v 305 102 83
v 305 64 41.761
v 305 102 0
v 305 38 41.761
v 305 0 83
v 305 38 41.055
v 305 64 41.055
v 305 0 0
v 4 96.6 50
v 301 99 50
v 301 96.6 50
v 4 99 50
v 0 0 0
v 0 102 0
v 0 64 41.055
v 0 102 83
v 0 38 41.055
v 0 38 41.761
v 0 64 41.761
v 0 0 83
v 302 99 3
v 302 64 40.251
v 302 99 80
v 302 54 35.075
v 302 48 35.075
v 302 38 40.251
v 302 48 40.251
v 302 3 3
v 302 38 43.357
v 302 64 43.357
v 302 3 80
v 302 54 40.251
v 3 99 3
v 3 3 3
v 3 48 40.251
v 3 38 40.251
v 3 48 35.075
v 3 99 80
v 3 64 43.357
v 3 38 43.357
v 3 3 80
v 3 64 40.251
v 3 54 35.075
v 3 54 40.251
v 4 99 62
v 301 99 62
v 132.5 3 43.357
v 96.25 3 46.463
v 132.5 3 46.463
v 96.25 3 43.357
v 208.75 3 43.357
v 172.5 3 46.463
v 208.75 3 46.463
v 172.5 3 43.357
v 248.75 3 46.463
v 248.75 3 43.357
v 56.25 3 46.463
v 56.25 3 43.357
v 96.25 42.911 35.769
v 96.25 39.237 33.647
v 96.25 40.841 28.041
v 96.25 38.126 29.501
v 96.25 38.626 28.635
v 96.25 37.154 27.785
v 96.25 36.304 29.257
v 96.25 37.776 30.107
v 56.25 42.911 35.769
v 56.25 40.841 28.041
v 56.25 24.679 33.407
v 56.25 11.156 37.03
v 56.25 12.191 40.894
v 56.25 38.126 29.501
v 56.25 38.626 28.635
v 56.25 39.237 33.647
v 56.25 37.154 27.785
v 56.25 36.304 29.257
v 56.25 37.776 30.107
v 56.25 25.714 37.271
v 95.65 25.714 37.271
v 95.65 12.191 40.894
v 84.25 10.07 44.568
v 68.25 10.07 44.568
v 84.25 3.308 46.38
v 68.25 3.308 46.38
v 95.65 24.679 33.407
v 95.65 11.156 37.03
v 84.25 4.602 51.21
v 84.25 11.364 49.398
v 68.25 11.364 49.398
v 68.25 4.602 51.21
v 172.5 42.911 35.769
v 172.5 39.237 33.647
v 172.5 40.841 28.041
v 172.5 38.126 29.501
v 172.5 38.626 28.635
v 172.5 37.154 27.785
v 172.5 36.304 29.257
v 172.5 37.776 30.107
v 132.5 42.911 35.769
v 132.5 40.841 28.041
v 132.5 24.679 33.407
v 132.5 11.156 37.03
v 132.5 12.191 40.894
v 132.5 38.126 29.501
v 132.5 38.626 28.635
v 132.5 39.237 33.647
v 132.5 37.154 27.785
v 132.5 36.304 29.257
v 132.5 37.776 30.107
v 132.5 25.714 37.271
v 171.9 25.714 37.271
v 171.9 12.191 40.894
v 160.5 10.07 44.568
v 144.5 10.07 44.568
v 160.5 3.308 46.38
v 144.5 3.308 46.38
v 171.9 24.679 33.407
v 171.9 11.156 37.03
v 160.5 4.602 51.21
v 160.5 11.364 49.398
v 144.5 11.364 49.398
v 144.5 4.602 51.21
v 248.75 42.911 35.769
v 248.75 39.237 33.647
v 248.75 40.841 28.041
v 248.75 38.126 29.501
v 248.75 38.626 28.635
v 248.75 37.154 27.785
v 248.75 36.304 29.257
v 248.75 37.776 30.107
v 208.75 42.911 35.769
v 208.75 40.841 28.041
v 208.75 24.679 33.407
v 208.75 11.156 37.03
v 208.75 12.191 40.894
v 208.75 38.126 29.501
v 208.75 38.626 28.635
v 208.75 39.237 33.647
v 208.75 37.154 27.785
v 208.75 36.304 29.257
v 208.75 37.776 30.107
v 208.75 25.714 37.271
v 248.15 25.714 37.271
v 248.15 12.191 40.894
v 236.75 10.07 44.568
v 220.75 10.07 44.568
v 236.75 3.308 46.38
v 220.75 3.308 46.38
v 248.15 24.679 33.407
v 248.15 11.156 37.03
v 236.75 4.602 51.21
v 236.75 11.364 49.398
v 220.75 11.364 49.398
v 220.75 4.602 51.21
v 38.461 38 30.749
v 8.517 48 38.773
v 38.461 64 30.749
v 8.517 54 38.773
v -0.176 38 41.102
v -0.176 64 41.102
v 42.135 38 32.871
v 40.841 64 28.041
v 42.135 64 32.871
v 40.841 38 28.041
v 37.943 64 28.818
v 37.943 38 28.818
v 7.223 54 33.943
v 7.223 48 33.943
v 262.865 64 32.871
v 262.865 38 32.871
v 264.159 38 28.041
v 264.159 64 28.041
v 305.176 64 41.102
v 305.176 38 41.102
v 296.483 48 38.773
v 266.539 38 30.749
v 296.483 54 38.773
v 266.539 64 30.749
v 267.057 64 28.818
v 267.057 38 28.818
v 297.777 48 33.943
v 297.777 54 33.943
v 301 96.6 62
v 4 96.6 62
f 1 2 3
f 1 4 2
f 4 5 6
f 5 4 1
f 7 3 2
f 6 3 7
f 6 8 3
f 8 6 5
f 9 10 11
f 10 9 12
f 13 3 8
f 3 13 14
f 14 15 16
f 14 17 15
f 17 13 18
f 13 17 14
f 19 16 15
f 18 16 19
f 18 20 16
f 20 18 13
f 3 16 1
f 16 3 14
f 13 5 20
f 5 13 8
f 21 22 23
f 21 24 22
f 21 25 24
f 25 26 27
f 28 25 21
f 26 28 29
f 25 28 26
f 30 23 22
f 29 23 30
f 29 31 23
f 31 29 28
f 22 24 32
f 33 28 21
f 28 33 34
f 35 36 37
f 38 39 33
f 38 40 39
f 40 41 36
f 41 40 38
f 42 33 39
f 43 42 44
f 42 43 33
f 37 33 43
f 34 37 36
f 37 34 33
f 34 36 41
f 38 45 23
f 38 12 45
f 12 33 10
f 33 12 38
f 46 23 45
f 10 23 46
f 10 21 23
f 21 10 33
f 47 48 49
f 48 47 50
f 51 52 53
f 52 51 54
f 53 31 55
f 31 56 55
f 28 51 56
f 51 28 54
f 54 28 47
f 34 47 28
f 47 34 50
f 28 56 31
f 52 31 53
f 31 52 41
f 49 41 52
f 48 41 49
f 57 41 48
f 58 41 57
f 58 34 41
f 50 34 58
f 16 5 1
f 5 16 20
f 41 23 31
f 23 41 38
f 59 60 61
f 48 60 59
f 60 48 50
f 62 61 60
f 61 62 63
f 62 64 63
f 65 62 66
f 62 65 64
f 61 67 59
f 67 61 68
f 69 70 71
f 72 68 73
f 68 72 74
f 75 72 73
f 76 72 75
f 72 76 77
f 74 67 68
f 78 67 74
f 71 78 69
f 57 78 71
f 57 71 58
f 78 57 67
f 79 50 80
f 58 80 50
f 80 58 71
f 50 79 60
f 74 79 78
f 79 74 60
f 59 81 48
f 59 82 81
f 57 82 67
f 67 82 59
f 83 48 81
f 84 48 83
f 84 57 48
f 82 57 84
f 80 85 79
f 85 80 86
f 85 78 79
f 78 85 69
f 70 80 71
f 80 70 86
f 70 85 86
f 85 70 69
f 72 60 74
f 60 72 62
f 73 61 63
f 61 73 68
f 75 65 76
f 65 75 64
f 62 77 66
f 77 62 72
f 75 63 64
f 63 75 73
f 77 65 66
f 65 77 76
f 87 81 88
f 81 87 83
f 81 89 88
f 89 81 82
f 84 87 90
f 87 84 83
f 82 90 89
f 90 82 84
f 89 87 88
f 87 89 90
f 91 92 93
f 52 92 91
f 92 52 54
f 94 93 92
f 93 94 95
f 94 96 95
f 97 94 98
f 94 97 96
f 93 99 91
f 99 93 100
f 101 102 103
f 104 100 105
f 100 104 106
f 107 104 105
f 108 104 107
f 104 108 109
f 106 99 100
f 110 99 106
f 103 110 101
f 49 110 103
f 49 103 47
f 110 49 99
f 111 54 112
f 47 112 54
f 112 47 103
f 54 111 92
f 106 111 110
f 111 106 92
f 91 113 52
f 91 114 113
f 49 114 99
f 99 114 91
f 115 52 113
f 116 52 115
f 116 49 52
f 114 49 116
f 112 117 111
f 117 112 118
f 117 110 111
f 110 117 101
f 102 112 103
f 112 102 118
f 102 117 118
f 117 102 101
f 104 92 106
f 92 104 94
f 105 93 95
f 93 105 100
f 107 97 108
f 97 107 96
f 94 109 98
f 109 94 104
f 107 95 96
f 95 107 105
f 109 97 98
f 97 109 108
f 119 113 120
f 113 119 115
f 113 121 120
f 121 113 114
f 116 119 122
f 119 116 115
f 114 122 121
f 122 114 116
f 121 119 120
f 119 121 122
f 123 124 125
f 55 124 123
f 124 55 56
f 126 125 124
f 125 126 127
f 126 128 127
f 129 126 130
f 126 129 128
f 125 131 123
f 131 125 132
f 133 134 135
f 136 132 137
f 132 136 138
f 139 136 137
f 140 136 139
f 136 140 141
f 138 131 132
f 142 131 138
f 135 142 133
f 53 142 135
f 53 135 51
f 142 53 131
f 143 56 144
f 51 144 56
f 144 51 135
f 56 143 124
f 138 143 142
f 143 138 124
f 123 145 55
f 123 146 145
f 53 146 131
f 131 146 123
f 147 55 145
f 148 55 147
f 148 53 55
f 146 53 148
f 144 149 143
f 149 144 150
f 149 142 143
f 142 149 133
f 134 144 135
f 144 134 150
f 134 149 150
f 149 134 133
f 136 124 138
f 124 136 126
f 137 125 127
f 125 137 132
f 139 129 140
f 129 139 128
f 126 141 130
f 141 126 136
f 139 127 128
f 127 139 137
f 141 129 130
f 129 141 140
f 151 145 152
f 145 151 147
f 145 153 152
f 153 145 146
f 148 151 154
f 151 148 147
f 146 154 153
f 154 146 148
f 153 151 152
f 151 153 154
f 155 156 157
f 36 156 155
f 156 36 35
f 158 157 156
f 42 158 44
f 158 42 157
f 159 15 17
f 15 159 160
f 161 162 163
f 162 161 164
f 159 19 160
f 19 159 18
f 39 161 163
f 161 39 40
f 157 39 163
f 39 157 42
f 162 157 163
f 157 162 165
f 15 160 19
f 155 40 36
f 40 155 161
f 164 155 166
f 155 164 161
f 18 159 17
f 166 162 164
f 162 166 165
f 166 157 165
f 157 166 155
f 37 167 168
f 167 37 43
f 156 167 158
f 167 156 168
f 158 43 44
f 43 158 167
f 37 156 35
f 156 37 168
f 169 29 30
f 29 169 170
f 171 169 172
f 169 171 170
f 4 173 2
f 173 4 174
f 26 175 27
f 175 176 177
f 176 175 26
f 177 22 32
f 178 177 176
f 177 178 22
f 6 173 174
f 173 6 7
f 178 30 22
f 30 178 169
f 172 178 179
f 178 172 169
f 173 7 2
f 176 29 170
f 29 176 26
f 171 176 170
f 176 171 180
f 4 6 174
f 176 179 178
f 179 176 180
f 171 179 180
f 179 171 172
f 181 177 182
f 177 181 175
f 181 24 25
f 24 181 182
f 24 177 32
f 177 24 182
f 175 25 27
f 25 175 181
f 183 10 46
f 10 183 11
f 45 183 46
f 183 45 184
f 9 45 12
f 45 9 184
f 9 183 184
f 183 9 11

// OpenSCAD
// file: common.scad
// common.scad — shared geometry for FLIP-LEVER / CAM-LATCH RIM CLAMP family
// Coordinate frame:
//   X: 0..305 (long axis)   Y: 0..102 (Y=0 FRONT/open, Y=102 BACK/door=FLUSH)
//   Z: up.  New tray base z=0, top face z=50.  Top tray base z=50, rim top z=83.
// ALL levers/hinges live on FRONT wall (y=0) and SHORT ENDS (x=0, x=305).
// NOTHING crosses y=102 (door face). Top tray gets ZERO added geometry.

// ── master dims ────────────────────────────────────────────────
NW = 305;  ND = 102;  NH = 50;   // new tray
TW = 305;  TD = 102;  TH = 33;   // top tray (FIXED reference)
wall = 3;
rim_top_z = NH + TH;             // = 83

// ── colours ────────────────────────────────────────────────────
C_new   = "#1565C0";
C_top   = "#90A4AE";
C_lever = "#EF6C00";   // override per file if desired

// ── core tray bodies ───────────────────────────────────────────
module new_tray() {
    color(C_new)
    difference() {
        cube([NW, ND, NH]);
        translate([wall, wall, wall])
            cube([NW-2*wall, ND-2*wall, NH]);
        // side windows (long walls): 45(X)x16(Z), center z=64 -> 56..72
        for (cx = [76.25, 152.5, 228.75]) {
            // FRONT wall y=0..3
            translate([cx-22.5, -0.1, 56]) cube([45, wall+0.2, 16]);
            // BACK wall y=99..102
            translate([cx-22.5, ND-wall-0.1, 56]) cube([45, wall+0.2, 16]);
        }
    }
}

// FLUSH back guide wall: a low rib on the new tray top face along the BACK
// edge that pockets the top tray's outer wall from the INSIDE only.
// It rises to z below the rim and DOES NOT overhang the drop path and
// NEVER crosses y=102 (it sits inboard of the door face).
module back_guide() {
    gw = 2.4;          // guide rib thickness
    gh = 12;           // rib height above new tray top (z=50..62)
    inset = wall;      // inner face aligns to tray inner wall (y=99 plane outer)
    color(C_new)
    translate([wall+1, ND - wall - gw, NH])
        cube([NW - 2*(wall+1), gw, gh]);
}

module top_tray() {
    color(C_top)
    translate([0, 0, NH])
    difference() {
        cube([TW, TD, TH]);
        translate([wall, wall, 0])
            cube([TW-2*wall, TD-2*wall, TH-wall]);
    }
}
// main file
// 04_window_hook_cams.scad
// FLIP-LEVER RIM CLAMP — Variant: THREE front cam levers whose hook does DOUBLE
// duty — a finger enters the front WINDOW (z56..72) to key/locate the lever, and
// the same arm's upper lip reaches OVER the rim (z>=83) to clamp the TOP tray.
// + end clamps. NONE on back/door.
//
// Why both: the window finger resists side-shift and hides the lever profile
// (low overhead); the rim lip provides the actual vertical clamp on the rigid
// top tray. Pure window entry alone cannot clamp the top tray, so we add the
// rim lip. Living-hinge web on the FRONT outer wall, axis along X at z=44.
include <common.scad>
C_lever = "#EF6C00";
lock = 0;
$fn = 48;

hinge_z   = NH - 6;
arm_len   = rim_top_z - hinge_z + 4;   // up past rim
bar_t     = 3.0;
lhinge_t  = 0.6;
lip_ext   = 5;
lip_t     = 3.0;
cam_w     = 40;
windows_x = [76.25, 152.5, 228.75];

// window finger: short stub partway up the arm that swings into the window slot
win_finger_z = 56 - hinge_z;   // local z where window starts (=12)
win_finger_h = 14;

ang_open   = -105;
ang_locked = 6;
cam_ang = lock ? ang_locked : ang_open;

module front_cam(cx) {
    color(C_lever)
    translate([cx-cam_w/2, lhinge_t, hinge_z])
    rotate([cam_ang, 0, 0])
    union() {
        translate([0, -bar_t, 0]) cube([cam_w, bar_t, arm_len]);
        // window-keying finger reaching inward (+Y) into the slot span
        translate([cam_w/2-20, 0, win_finger_z])
            cube([40-0.6, 4, win_finger_h]);   // slightly narrower than 45 window
        // rim clamp lip on top
        translate([0, 0, arm_len-lip_t]) cube([cam_w, lip_ext, lip_t]);
        translate([0, lip_ext, arm_len-lip_t])
            rotate([45,0,0]) translate([0,-1.2,-1.2]) cube([cam_w,1.7,1.7]);
        translate([cam_w/2-8, -bar_t-5, 2]) cube([16,5,7]);
    }
    color(C_lever)
    translate([cx-cam_w/2, 0, hinge_z-3]) cube([cam_w, lhinge_t, 3]);
}

end_w = 26;
module end_clamp(side) {
    xbase = side<0 ? lhinge_t : NW - lhinge_t;
    eang = lock ? 6 : -105;
    yoff = (ND-end_w)/2;
    sx = side<0 ? 1 : -1;
    color(C_lever)
    translate([xbase, yoff, hinge_z])
    rotate([0, side<0 ? -eang : eang, 0])
    union() {
        translate([sx<0 ? -bar_t:0, 0, 0]) cube([bar_t, end_w, arm_len]);
        translate([sx<0 ? -lip_ext:0, 0, arm_len-lip_t]) cube([lip_ext, end_w, lip_t]);
        translate([sx<0 ? -bar_t-5:bar_t, end_w/2-3, 2]) cube([5,6,7]);
    }
}

new_tray();
back_guide();
top_tray();
for (cx = windows_x) front_cam(cx);
end_clamp(-1);
end_clamp(1);
